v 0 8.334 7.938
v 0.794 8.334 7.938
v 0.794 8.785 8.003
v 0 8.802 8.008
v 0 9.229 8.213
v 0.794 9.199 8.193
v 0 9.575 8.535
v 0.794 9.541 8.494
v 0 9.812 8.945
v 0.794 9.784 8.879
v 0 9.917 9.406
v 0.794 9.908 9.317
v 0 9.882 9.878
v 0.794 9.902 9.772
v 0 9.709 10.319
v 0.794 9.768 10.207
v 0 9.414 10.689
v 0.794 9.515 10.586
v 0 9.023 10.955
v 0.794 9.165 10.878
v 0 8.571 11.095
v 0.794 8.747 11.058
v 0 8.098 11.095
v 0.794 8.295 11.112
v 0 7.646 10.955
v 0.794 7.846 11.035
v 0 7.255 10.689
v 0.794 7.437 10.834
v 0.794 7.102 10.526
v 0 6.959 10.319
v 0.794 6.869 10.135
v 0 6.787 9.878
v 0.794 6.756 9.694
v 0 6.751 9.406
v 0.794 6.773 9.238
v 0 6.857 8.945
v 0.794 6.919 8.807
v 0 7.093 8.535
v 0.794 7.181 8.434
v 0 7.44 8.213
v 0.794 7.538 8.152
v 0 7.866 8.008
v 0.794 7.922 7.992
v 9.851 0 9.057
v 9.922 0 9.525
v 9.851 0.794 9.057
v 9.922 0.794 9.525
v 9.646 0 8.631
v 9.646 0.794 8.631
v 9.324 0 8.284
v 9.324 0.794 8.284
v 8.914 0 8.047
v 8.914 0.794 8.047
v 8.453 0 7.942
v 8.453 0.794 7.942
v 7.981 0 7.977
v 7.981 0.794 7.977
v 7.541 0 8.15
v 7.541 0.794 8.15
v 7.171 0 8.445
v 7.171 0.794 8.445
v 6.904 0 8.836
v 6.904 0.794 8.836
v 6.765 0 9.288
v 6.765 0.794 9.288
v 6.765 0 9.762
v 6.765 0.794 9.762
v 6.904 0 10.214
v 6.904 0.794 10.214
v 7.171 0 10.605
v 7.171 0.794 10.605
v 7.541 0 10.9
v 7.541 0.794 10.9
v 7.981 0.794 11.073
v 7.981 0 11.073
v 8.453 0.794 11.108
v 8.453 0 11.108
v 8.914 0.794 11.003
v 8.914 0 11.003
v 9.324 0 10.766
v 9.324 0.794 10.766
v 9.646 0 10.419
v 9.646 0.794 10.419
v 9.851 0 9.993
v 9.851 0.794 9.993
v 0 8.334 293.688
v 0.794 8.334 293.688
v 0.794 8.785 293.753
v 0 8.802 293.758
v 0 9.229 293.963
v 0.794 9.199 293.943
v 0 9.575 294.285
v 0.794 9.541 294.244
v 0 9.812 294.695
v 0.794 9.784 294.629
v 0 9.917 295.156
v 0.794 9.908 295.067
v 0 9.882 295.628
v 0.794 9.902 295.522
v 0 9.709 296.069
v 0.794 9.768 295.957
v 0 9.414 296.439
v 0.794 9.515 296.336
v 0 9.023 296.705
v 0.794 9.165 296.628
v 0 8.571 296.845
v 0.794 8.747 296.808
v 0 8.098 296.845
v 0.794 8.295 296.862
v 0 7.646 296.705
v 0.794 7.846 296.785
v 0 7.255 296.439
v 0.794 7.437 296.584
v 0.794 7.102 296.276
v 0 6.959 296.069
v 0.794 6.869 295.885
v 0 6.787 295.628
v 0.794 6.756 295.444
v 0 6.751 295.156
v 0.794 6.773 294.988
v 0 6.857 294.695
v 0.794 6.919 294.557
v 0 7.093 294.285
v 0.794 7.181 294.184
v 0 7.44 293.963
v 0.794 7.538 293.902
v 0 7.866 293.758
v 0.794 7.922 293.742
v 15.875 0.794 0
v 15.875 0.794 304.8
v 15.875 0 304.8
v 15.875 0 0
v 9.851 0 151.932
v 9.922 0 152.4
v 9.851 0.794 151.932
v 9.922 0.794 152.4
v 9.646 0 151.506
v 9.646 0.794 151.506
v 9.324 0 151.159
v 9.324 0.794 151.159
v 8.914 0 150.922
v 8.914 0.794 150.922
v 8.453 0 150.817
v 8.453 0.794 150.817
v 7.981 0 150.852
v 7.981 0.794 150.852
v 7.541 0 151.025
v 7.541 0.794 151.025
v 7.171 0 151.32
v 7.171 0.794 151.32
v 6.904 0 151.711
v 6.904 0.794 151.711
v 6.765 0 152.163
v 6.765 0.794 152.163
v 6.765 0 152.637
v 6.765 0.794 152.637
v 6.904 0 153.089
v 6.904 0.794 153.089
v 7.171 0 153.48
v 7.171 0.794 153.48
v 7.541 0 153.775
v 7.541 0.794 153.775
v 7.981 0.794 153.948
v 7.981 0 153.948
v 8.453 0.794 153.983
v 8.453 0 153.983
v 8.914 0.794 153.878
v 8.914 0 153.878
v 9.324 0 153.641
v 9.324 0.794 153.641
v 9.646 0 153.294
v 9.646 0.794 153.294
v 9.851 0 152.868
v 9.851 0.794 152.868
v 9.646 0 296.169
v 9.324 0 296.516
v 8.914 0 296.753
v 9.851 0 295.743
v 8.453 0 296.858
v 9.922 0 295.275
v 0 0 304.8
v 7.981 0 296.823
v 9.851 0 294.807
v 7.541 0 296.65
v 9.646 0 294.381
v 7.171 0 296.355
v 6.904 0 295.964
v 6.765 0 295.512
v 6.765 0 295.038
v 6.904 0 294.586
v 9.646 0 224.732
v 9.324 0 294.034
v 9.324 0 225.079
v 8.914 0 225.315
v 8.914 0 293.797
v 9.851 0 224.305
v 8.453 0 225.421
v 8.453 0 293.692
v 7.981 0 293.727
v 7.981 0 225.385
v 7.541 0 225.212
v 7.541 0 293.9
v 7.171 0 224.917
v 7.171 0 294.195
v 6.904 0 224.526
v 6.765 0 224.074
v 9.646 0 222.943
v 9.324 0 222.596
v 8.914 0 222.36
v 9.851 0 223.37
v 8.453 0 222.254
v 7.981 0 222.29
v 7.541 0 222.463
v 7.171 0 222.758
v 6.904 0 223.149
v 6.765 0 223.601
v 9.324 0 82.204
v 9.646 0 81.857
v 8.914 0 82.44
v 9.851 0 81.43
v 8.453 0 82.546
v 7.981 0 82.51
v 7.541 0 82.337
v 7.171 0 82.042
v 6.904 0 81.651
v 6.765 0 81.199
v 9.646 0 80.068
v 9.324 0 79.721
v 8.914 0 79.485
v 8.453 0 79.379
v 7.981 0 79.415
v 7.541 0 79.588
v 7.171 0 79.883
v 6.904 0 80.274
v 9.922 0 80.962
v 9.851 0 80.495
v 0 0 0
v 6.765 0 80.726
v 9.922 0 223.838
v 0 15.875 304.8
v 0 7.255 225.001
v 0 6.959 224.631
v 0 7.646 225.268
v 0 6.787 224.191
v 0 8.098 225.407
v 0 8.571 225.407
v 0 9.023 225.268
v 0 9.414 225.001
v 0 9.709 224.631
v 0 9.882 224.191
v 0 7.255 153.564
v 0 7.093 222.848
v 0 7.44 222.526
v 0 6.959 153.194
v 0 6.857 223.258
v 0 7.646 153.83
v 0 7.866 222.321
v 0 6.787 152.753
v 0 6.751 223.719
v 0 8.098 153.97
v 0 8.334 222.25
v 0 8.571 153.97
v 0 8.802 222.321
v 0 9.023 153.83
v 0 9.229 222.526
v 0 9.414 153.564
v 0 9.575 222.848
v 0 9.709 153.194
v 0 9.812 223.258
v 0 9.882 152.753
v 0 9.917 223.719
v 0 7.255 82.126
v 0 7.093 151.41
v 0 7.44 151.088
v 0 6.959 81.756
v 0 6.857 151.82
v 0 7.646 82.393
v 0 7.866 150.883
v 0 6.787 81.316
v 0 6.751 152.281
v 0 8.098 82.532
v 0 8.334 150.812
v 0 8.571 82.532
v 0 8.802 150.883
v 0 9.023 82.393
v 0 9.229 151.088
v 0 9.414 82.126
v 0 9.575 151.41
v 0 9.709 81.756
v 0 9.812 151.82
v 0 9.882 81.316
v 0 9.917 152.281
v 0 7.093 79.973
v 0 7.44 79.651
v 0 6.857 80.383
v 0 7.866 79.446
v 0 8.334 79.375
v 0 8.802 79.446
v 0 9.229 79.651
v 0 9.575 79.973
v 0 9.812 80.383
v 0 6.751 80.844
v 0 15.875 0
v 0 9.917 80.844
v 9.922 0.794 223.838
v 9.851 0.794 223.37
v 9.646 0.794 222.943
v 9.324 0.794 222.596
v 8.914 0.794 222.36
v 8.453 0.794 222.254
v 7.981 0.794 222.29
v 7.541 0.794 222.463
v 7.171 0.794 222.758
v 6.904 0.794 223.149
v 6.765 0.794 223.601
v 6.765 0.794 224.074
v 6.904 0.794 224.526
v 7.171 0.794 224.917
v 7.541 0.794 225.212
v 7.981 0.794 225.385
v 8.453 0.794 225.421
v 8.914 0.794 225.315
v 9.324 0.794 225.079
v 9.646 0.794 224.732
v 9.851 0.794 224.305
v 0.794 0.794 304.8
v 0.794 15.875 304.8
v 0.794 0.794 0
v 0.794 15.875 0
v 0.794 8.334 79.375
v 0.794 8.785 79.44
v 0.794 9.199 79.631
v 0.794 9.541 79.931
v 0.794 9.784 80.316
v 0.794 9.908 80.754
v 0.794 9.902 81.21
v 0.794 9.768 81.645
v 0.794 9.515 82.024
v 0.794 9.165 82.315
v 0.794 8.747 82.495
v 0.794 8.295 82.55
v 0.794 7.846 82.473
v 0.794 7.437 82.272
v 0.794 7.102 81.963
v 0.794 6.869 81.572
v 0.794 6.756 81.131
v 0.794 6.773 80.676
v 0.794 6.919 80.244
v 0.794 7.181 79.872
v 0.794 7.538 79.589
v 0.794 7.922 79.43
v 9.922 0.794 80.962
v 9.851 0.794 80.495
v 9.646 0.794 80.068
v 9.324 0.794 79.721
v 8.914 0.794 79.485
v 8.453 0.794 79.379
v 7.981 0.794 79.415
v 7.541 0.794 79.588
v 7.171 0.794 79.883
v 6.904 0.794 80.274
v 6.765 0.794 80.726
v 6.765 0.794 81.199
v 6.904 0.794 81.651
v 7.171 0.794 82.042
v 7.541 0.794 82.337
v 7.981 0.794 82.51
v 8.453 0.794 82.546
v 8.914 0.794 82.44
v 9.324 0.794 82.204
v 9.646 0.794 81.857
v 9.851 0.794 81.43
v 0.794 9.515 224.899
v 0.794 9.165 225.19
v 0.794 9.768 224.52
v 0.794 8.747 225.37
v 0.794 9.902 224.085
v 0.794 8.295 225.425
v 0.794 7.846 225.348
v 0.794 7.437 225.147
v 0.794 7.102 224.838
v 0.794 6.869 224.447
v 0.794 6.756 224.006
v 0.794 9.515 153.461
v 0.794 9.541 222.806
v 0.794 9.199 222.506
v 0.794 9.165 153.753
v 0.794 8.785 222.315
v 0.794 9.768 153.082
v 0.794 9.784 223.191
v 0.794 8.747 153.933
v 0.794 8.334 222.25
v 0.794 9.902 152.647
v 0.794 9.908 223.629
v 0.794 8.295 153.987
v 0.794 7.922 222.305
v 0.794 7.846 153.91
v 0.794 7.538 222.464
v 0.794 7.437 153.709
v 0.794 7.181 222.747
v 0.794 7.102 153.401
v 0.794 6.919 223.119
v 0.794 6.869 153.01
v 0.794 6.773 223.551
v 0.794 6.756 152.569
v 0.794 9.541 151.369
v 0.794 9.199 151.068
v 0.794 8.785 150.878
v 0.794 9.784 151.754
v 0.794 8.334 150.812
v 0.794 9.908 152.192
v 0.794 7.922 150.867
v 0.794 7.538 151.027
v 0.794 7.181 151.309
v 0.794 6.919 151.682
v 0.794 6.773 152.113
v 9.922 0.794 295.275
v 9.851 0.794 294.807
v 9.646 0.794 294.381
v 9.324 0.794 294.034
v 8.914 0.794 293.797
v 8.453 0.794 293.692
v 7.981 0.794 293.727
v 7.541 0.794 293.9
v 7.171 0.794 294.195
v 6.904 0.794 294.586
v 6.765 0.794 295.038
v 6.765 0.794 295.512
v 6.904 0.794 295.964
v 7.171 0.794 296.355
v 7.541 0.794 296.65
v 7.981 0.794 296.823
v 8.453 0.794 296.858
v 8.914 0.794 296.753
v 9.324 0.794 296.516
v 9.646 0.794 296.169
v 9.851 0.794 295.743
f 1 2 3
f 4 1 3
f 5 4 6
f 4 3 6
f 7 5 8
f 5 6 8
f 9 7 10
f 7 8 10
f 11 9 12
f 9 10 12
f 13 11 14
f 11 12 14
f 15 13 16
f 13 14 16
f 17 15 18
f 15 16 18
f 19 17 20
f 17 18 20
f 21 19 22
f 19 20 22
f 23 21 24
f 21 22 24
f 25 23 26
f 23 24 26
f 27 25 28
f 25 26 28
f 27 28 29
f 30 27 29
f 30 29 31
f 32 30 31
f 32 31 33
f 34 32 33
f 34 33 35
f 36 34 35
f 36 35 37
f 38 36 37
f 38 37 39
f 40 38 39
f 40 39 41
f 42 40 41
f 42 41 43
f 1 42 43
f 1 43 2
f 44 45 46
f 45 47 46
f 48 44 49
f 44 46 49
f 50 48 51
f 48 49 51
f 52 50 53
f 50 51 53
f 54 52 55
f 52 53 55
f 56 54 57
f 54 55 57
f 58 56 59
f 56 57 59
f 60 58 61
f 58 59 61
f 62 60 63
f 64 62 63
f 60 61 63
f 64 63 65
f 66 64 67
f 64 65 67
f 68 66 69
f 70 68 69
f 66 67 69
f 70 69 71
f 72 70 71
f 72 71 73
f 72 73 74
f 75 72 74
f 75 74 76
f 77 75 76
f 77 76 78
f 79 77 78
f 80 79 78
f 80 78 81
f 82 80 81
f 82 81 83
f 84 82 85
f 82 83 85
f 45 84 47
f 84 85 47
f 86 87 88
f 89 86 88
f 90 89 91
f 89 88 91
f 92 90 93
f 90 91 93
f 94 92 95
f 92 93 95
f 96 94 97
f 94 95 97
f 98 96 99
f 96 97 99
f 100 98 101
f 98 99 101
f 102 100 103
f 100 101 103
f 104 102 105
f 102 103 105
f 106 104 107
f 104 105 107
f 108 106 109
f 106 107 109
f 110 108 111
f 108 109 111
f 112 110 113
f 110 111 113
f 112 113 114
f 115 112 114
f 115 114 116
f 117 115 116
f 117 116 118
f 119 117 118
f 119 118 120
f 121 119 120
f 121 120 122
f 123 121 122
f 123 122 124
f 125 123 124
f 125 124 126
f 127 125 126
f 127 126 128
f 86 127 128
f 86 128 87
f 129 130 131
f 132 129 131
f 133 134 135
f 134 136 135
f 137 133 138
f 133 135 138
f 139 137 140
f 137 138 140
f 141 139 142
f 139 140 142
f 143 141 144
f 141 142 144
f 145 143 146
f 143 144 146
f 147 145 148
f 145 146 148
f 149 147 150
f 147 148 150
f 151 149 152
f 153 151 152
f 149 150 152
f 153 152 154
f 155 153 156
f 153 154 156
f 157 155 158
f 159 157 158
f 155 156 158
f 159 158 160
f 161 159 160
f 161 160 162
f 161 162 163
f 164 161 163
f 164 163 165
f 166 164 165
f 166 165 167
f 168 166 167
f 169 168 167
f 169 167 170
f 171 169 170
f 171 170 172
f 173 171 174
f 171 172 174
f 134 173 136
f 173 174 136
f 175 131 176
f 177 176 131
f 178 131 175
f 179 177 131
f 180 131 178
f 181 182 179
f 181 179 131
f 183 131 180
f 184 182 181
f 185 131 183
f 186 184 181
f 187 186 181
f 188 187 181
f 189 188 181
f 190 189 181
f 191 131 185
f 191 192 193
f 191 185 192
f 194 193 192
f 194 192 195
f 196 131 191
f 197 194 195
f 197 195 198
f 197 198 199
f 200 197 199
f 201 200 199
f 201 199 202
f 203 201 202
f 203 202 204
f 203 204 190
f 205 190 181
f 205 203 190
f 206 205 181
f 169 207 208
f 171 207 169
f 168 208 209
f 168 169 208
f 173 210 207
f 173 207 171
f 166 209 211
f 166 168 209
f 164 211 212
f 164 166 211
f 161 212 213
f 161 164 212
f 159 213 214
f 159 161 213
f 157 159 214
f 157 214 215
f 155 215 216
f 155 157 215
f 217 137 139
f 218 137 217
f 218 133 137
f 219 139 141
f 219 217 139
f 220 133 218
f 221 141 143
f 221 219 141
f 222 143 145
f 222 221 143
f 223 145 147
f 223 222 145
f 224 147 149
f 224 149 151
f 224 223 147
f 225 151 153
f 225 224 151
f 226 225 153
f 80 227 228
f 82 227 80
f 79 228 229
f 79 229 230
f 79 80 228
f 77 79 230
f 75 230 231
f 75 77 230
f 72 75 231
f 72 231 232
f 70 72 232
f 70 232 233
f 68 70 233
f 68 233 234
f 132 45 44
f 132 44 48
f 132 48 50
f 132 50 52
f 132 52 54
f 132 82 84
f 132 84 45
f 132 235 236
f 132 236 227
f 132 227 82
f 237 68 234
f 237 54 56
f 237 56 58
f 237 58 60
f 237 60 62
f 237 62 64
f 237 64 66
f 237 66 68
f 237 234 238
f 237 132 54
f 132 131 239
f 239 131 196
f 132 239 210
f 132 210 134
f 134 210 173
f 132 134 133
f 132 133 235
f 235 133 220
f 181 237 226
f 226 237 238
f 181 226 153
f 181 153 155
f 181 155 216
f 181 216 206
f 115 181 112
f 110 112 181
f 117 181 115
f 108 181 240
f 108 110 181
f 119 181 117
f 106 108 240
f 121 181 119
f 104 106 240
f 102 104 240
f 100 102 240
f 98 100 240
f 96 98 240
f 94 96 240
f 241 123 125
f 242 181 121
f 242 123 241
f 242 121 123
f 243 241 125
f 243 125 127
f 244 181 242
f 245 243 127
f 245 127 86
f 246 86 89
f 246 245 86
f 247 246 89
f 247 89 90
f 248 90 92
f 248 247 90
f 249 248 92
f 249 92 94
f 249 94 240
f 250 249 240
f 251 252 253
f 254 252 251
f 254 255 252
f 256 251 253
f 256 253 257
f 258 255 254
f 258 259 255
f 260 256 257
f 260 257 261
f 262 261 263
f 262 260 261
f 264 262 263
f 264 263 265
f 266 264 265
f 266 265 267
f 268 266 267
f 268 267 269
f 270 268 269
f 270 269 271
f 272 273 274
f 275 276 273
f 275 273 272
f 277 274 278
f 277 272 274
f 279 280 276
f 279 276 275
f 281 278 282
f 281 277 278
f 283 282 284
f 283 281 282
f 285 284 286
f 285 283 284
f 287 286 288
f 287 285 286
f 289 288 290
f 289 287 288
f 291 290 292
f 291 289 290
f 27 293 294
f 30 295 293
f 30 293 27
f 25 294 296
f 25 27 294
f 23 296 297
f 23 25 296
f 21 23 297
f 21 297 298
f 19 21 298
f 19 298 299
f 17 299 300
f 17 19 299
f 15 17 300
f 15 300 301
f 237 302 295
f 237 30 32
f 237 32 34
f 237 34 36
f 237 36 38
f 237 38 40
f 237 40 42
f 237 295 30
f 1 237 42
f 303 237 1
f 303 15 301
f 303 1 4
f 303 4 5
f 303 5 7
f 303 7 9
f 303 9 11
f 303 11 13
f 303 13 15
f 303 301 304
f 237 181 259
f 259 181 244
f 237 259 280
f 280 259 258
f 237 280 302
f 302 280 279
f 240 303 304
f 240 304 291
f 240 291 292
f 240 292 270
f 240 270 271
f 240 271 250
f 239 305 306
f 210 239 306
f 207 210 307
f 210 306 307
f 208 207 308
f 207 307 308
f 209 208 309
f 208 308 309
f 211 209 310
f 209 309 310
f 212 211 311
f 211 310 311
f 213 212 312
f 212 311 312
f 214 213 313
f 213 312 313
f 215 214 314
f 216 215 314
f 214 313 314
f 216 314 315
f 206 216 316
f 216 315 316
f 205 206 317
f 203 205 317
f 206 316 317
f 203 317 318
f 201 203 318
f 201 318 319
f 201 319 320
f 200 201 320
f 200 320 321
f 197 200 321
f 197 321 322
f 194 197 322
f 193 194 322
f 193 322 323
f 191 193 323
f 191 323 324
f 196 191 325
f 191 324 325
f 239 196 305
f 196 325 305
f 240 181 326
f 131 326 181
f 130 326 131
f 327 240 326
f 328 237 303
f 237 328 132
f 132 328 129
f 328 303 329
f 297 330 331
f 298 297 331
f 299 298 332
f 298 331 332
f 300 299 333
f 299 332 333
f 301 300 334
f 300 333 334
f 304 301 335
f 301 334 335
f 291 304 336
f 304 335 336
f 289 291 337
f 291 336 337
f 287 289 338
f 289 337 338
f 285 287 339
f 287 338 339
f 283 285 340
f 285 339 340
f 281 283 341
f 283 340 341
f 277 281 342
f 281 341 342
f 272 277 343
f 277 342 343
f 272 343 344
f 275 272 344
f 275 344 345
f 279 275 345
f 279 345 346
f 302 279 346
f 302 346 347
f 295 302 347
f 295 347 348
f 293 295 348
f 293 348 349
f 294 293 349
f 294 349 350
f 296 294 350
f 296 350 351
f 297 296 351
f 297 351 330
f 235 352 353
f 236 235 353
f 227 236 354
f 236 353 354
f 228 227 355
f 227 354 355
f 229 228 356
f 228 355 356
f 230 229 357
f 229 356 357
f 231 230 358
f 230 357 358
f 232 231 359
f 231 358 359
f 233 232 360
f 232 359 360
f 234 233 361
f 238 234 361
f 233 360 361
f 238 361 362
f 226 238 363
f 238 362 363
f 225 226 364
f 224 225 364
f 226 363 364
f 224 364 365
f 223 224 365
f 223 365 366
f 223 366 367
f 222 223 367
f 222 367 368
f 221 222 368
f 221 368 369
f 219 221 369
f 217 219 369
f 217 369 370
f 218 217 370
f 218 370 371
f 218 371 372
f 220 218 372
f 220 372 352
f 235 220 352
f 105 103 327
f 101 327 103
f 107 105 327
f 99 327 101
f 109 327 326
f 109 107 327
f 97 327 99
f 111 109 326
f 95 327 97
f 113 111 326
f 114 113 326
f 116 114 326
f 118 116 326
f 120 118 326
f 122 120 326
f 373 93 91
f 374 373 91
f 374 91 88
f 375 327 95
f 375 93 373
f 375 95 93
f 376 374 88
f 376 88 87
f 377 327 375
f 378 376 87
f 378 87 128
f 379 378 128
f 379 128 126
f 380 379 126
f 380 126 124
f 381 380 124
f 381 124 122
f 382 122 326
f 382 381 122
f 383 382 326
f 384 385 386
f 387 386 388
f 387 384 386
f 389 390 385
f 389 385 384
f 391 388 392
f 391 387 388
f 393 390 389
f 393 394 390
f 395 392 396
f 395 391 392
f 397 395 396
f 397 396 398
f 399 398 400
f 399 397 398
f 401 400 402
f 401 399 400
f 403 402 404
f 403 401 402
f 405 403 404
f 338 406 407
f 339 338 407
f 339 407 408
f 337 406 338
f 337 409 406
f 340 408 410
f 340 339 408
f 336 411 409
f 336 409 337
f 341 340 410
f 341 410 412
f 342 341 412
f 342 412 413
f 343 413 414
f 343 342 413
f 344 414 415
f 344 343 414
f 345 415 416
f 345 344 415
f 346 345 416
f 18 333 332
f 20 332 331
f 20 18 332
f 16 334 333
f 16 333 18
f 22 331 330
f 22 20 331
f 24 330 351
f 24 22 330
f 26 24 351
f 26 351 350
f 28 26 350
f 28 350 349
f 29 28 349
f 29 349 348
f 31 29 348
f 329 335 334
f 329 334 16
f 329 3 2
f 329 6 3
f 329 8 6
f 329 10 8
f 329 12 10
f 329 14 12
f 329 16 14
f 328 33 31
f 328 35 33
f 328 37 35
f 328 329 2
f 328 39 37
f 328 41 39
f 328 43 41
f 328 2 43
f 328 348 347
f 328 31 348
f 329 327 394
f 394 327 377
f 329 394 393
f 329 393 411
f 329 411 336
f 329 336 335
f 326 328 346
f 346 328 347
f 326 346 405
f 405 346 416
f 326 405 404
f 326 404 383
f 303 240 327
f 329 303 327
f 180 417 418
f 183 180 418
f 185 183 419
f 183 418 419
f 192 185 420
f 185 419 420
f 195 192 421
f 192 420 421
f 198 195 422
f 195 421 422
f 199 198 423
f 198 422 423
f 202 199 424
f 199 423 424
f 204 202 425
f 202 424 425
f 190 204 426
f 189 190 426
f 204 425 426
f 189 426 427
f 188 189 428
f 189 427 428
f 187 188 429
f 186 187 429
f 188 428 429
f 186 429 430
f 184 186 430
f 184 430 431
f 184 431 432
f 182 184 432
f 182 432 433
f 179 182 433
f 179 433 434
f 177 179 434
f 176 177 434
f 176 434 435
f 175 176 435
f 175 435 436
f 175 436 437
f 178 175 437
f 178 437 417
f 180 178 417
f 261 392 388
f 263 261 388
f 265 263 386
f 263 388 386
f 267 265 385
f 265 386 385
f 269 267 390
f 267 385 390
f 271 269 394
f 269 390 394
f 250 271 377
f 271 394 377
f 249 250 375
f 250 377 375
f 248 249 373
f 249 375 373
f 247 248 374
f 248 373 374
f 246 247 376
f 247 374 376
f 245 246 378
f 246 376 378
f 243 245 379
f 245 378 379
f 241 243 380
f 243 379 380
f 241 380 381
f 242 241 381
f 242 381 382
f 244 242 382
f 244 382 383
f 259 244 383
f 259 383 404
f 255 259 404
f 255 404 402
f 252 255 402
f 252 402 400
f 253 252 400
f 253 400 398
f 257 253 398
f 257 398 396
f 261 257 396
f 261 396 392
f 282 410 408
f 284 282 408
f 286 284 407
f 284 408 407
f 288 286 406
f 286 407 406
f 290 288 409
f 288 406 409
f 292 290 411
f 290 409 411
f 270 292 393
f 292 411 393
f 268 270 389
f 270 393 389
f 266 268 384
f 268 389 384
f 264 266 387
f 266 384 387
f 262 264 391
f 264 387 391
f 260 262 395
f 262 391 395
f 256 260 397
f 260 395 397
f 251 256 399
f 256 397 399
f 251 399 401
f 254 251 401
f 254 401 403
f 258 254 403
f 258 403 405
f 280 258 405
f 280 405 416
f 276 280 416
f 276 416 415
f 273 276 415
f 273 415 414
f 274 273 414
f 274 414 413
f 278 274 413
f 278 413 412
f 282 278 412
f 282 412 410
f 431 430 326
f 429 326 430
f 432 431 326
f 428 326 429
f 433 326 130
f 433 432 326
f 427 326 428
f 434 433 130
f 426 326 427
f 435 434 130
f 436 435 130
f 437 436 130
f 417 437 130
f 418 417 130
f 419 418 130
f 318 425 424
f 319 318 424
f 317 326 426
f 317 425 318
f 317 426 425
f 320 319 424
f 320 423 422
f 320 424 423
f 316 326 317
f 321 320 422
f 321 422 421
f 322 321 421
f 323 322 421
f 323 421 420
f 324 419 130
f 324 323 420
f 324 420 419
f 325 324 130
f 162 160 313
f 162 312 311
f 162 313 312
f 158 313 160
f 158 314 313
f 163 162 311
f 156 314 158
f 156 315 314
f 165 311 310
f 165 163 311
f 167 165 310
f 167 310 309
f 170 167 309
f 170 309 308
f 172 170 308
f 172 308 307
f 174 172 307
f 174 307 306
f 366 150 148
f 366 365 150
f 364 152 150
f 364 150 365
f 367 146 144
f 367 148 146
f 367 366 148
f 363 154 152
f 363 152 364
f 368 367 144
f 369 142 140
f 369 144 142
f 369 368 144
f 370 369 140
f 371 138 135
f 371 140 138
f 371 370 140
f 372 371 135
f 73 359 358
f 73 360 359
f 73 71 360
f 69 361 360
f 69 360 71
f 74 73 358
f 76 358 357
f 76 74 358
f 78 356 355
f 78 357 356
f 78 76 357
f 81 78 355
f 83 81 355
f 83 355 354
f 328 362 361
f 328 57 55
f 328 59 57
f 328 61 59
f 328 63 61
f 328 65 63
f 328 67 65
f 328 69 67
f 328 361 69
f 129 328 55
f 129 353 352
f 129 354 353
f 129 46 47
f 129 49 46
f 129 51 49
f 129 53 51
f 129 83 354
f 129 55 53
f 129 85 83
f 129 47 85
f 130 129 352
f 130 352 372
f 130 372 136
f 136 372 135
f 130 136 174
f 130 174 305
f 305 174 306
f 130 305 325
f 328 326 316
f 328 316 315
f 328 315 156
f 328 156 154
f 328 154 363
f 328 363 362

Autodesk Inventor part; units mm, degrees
ref_plane "YZ Plane" through (0, 0, 0) normal (1, 0, 0) x (0, 1, 0)
ref_plane "XZ Plane" through (0, 0, 0) normal (0, 1, 0) x (-1, 0, 0)
ref_plane "XY Plane" through (0, 0, 0) normal (0, 0, 1) x (1, 0, 0)
sketch "Sketch1" plane through (0, 0, 0) normal (0, 0, 1) x (1, 0, 0)
  line L0 (0, 0) -> (0, 15.875)
  line L1 (0, 15.875) -> (0.7937, 15.875)
  line L2 (0.7937, 15.875) -> (0.7938, 0.7937)
  line L3 (0.7938, 0.7937) -> (15.875, 0.7937)
  line L4 (15.875, 0.7937) -> (15.875, 0)
  line L5 (15.875, 0) -> (0, 0)
  dimension "d0" = 15.875
  dimension "d1" = 0.7937
extrude "Extrusion1" add sketch "Sketch1" along normal blind 304.8
sketch "Sketch2" plane through (0.7938, 0.7937, 0) normal (0, 1, 0) x (1, 0, 0)
  line L0 (0, 0) -> (15.0812, 0) projected
  line L1 (15.0812, -304.8) -> (0, -304.8) projected
  line L2 (7.5406, 0) -> (7.5406, -304.8) construction
  circle A0 centre (7.5406, -9.525) radius 1.5875
  circle A1 centre (7.5406, -80.9625) radius 1.5875
  circle A2 centre (7.5406, -152.4) radius 1.5875
  circle A3 centre (7.5406, -223.8375) radius 1.5875
  circle A4 centre (7.5406, -295.275) radius 1.5875
  point P0 (-0.7938, 0)
  dimension "d4" = 9.525
  dimension "d5" = 3.175
  dimension "d6" = 304.8
  dimension "d9" = 71.4375
sketch "Sketch3" plane through (0.7938, 0.7937, 0) normal (1, 0, 0) x (0, 0, -1)
  line L0 (0, 15.0812) -> (0, 0) projected
  line L1 (-304.8, 0) -> (-304.8, 15.0812) projected
  line L2 (-304.8, 7.5406) -> (0, 7.5406) construction
  circle A0 centre (-9.525, 7.5406) radius 1.5875
  circle A1 centre (-80.9625, 7.5406) radius 1.5875
  circle A2 centre (-152.4, 7.5406) radius 1.5875
  circle A3 centre (-223.8375, 7.5406) radius 1.5875
  circle A4 centre (-295.275, 7.5406) radius 1.5875
  point P0 (0, -0.7937)
  dimension "d14" = 3.175
  dimension "d15" = 9.525
  dimension "d16" = 304.8
  dimension "d19" = 71.4375
extrude "Extrusion2" cut sketch "Sketch2" against normal through all
extrude "Extrusion3" cut sketch "Sketch3" against normal through all
properties part number "Hopper Bracing Right Bottom P9" material "Aluminum 6061"
